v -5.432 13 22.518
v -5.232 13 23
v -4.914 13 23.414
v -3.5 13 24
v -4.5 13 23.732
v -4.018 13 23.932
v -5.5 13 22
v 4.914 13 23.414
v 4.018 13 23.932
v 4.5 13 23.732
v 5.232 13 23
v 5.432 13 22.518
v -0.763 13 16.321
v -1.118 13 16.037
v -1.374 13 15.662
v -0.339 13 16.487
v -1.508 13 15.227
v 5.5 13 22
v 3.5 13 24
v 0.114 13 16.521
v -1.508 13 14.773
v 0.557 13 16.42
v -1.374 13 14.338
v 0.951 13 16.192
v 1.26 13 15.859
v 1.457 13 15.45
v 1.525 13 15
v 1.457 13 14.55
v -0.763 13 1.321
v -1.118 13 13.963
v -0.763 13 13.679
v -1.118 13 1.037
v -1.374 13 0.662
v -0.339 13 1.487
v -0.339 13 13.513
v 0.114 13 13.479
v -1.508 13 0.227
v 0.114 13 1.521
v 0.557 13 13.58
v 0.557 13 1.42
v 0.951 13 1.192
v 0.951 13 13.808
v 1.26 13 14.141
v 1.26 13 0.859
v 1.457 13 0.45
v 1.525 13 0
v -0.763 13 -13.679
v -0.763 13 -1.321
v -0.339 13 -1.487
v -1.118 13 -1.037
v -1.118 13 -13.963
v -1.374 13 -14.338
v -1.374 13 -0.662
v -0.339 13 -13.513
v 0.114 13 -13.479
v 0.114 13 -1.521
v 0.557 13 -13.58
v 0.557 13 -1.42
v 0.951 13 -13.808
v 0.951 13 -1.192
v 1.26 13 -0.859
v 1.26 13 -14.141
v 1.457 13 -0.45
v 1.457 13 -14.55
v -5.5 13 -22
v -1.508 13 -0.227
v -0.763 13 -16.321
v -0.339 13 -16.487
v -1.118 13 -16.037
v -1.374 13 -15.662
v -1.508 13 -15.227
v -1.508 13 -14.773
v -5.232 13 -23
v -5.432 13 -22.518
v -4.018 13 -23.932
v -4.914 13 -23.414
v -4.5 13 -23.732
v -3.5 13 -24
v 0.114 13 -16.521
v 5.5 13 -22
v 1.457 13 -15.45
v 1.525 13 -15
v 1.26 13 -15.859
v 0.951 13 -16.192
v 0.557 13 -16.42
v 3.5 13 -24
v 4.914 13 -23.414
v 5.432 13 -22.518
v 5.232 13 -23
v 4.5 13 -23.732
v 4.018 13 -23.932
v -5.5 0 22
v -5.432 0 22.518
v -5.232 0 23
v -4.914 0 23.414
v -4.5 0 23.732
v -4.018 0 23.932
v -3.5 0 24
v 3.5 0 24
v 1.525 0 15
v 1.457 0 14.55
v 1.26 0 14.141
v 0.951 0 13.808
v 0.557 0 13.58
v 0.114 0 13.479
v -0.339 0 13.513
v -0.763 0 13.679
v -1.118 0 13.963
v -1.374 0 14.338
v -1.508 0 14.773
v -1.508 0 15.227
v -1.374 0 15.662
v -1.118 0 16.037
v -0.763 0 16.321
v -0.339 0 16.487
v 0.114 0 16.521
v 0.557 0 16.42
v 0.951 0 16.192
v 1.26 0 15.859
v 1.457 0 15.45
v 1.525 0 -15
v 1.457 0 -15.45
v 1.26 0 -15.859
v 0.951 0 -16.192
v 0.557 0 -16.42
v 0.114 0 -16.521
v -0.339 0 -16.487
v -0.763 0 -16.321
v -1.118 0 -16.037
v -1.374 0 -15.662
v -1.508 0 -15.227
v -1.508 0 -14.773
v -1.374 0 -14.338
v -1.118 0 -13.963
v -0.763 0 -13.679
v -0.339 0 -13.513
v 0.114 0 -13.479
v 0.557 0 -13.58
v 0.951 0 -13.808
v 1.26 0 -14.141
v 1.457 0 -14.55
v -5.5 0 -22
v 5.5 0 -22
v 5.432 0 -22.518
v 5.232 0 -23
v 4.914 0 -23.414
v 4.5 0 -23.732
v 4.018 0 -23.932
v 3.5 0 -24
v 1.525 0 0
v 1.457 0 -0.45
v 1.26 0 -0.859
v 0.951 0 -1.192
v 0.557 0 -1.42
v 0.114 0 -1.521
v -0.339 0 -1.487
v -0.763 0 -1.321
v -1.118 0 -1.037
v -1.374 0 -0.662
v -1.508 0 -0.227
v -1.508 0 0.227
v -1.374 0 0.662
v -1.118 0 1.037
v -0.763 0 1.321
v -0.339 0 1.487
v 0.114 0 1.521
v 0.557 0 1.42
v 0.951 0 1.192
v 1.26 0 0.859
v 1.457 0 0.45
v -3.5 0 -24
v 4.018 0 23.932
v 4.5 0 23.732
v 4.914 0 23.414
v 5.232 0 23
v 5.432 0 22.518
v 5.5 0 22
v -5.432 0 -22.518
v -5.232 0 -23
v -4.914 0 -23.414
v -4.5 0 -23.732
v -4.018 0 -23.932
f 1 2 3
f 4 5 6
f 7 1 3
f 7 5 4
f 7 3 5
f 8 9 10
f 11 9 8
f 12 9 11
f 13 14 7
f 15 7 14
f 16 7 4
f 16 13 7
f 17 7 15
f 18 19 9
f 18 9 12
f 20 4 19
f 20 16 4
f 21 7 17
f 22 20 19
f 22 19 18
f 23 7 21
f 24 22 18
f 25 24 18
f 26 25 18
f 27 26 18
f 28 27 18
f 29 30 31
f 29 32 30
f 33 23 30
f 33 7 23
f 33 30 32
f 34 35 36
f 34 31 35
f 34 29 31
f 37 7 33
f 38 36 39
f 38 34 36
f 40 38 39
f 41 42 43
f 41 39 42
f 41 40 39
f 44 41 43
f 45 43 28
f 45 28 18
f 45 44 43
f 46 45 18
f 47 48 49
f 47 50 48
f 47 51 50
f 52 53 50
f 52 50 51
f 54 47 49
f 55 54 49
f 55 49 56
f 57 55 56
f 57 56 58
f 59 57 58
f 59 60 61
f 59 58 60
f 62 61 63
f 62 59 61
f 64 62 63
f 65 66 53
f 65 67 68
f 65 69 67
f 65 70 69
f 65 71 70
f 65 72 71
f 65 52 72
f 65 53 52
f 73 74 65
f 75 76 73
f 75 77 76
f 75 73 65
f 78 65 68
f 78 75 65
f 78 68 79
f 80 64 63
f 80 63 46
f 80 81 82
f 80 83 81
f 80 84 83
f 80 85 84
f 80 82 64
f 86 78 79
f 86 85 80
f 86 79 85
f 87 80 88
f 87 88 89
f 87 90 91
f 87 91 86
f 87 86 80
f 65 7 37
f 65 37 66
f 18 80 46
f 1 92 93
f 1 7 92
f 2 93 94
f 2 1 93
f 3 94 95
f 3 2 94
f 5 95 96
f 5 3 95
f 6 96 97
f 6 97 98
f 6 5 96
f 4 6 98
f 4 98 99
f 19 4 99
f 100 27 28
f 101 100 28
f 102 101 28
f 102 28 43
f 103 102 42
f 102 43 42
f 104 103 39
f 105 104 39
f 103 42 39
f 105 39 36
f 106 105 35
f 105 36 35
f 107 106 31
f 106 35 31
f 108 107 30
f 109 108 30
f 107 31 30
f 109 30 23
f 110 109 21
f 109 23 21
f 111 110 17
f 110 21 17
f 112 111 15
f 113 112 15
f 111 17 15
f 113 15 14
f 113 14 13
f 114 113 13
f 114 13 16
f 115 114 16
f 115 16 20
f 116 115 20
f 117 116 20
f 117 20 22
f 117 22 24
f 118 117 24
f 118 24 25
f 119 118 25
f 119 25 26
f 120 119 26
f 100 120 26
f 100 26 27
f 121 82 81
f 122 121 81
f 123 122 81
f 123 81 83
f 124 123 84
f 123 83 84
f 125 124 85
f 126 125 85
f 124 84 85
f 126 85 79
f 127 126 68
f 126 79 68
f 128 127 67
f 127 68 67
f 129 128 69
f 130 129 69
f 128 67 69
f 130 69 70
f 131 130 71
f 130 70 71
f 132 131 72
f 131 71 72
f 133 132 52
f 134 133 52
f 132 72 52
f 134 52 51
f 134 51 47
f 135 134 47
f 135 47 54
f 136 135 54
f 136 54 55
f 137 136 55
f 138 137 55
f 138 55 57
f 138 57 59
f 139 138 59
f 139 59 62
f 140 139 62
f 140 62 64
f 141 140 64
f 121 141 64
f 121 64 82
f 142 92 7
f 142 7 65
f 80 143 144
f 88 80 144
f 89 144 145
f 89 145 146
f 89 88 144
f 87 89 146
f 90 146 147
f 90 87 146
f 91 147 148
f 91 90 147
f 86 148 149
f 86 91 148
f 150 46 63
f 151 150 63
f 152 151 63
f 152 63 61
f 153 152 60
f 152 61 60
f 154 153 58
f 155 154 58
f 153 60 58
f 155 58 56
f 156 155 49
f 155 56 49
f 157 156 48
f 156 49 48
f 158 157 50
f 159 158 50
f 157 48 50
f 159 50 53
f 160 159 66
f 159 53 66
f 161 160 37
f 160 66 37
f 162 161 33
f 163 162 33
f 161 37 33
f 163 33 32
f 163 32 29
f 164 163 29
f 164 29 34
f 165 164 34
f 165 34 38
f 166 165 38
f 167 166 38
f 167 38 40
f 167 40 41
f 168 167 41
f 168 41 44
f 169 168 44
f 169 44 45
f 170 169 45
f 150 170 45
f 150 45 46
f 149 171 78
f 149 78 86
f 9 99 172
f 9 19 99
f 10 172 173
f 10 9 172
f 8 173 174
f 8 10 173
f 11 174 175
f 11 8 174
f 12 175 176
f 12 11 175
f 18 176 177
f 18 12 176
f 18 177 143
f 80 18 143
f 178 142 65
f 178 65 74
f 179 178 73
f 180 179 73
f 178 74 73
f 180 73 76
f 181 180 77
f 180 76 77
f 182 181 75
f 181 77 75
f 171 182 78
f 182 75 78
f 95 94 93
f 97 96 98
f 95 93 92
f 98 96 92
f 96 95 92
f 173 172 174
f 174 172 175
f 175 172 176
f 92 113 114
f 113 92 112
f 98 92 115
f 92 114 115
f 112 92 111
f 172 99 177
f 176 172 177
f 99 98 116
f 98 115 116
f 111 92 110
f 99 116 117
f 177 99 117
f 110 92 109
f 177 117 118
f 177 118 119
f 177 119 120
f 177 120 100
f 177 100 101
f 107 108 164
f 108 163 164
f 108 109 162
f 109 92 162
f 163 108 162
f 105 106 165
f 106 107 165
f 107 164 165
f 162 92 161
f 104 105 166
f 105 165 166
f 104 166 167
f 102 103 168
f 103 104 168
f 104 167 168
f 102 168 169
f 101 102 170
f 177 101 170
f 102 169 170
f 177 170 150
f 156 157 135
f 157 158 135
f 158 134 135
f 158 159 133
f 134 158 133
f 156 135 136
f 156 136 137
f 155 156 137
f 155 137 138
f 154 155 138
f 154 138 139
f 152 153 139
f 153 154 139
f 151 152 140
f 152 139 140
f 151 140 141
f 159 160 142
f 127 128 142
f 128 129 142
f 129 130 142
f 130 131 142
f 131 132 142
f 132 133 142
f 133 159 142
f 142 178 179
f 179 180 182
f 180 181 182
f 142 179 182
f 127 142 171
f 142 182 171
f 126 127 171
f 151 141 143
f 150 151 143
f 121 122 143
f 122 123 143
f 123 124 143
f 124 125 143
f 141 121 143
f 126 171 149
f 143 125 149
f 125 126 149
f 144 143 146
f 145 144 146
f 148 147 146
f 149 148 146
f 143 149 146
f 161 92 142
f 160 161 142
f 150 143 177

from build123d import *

# Parameters (mm, degrees)
SKETCH_1_W          = 11
SKETCH_1_H          = 48
EXTRUDE_1_DEPTH     = 13
FILLET_1_R          = 2
SKETCH_5_R          = 1.525
CUT_EXTRUDE_1_DEPTH = 14


with BuildPart() as part:
    # 草图1 → 凸台-拉伸1 (new body)
    with BuildSketch(Plane(origin=(0, 0, 0), x_dir=(1, 0, 0), z_dir=(0, 1, 0))):
        Rectangle(SKETCH_1_W, SKETCH_1_H)
    extrude(amount=EXTRUDE_1_DEPTH)

    # 圆角1
    fillet_1_edges = [part.edges().sort_by_distance(p)[0] for p in [
        (5.5, 6.5, 24),
        (-5.5, 6.5, 24),
        (-5.5, 6.5, -24),
        (5.5, 6.5, -24),
    ]]
    fillet(fillet_1_edges, radius=FILLET_1_R)

    # 草图5 → 切除-拉伸1 (cut, through all)
    with BuildSketch(Plane(origin=(0, 13, 0), x_dir=(1, 0, 0), z_dir=(0, 1, 0))):
        Circle(SKETCH_5_R)
        with Locations((0, 15)):
            Circle(SKETCH_5_R)
        with Locations((0, -15)):
            Circle(SKETCH_5_R)
    extrude(amount=-CUT_EXTRUDE_1_DEPTH, mode=Mode.SUBTRACT)


solid = part.part
